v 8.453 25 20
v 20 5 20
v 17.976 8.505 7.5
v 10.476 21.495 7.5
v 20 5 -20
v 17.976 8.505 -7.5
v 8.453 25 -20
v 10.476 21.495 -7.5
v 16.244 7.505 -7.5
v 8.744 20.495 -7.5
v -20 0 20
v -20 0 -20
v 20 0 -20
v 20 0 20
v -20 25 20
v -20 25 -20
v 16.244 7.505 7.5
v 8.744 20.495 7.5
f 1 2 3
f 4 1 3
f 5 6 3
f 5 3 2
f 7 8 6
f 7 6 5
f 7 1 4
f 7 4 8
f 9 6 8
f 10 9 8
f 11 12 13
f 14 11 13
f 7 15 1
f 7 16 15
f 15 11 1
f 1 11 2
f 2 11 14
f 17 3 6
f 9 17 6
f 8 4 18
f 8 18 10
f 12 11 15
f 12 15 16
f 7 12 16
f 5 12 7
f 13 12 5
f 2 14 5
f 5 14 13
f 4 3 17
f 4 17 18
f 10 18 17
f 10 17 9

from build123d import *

# Parameters (mm, degrees)
ESQUISSE1_W             = 40
ESQUISSE1_H             = 40
BOSS_EXTRU_1_DEPTH      = 25
CHANFREIN1_SIZE         = 20
CHANFREIN1_SIZE2        = 11.547005384
ESQUISSE2_W             = 15
ESQUISSE2_H             = 15
ENL_V_MAT_EXTRU_1_DEPTH = 2


with BuildPart() as part:
    # Esquisse1 → Boss.-Extru.1 (new body)
    with BuildSketch(Plane(origin=(0, 0, 0), x_dir=(1, 0, 0), z_dir=(0, 1, 0))):
        Rectangle(ESQUISSE1_W, ESQUISSE1_H)
    extrude(amount=BOSS_EXTRU_1_DEPTH)

    # Chanfrein1
    chanfrein1_edges = [part.edges().sort_by_distance(p)[0] for p in [
        (20, 25, 0),
    ]]
    chanfrein1_side = [part.faces().sort_by_distance(p)[0] for p in [
        (20, 12.5, 0),
    ]]
    chamfer(chanfrein1_edges, length=CHANFREIN1_SIZE, length2=CHANFREIN1_SIZE2, reference=chanfrein1_side[0])

    # Esquisse2 → Enlèv. mat.-Extru.1 (cut)
    with BuildSketch(Plane(origin=(17.165063509, 9.910254038, 0), x_dir=(0, 0, -1), z_dir=(0.8660254037844397, 0.4999999999999983, 0))):
        with Locations((0, 5.877132403)):
            Rectangle(ESQUISSE2_W, ESQUISSE2_H)
    extrude(amount=-ENL_V_MAT_EXTRU_1_DEPTH, mode=Mode.SUBTRACT)


solid = part.part
